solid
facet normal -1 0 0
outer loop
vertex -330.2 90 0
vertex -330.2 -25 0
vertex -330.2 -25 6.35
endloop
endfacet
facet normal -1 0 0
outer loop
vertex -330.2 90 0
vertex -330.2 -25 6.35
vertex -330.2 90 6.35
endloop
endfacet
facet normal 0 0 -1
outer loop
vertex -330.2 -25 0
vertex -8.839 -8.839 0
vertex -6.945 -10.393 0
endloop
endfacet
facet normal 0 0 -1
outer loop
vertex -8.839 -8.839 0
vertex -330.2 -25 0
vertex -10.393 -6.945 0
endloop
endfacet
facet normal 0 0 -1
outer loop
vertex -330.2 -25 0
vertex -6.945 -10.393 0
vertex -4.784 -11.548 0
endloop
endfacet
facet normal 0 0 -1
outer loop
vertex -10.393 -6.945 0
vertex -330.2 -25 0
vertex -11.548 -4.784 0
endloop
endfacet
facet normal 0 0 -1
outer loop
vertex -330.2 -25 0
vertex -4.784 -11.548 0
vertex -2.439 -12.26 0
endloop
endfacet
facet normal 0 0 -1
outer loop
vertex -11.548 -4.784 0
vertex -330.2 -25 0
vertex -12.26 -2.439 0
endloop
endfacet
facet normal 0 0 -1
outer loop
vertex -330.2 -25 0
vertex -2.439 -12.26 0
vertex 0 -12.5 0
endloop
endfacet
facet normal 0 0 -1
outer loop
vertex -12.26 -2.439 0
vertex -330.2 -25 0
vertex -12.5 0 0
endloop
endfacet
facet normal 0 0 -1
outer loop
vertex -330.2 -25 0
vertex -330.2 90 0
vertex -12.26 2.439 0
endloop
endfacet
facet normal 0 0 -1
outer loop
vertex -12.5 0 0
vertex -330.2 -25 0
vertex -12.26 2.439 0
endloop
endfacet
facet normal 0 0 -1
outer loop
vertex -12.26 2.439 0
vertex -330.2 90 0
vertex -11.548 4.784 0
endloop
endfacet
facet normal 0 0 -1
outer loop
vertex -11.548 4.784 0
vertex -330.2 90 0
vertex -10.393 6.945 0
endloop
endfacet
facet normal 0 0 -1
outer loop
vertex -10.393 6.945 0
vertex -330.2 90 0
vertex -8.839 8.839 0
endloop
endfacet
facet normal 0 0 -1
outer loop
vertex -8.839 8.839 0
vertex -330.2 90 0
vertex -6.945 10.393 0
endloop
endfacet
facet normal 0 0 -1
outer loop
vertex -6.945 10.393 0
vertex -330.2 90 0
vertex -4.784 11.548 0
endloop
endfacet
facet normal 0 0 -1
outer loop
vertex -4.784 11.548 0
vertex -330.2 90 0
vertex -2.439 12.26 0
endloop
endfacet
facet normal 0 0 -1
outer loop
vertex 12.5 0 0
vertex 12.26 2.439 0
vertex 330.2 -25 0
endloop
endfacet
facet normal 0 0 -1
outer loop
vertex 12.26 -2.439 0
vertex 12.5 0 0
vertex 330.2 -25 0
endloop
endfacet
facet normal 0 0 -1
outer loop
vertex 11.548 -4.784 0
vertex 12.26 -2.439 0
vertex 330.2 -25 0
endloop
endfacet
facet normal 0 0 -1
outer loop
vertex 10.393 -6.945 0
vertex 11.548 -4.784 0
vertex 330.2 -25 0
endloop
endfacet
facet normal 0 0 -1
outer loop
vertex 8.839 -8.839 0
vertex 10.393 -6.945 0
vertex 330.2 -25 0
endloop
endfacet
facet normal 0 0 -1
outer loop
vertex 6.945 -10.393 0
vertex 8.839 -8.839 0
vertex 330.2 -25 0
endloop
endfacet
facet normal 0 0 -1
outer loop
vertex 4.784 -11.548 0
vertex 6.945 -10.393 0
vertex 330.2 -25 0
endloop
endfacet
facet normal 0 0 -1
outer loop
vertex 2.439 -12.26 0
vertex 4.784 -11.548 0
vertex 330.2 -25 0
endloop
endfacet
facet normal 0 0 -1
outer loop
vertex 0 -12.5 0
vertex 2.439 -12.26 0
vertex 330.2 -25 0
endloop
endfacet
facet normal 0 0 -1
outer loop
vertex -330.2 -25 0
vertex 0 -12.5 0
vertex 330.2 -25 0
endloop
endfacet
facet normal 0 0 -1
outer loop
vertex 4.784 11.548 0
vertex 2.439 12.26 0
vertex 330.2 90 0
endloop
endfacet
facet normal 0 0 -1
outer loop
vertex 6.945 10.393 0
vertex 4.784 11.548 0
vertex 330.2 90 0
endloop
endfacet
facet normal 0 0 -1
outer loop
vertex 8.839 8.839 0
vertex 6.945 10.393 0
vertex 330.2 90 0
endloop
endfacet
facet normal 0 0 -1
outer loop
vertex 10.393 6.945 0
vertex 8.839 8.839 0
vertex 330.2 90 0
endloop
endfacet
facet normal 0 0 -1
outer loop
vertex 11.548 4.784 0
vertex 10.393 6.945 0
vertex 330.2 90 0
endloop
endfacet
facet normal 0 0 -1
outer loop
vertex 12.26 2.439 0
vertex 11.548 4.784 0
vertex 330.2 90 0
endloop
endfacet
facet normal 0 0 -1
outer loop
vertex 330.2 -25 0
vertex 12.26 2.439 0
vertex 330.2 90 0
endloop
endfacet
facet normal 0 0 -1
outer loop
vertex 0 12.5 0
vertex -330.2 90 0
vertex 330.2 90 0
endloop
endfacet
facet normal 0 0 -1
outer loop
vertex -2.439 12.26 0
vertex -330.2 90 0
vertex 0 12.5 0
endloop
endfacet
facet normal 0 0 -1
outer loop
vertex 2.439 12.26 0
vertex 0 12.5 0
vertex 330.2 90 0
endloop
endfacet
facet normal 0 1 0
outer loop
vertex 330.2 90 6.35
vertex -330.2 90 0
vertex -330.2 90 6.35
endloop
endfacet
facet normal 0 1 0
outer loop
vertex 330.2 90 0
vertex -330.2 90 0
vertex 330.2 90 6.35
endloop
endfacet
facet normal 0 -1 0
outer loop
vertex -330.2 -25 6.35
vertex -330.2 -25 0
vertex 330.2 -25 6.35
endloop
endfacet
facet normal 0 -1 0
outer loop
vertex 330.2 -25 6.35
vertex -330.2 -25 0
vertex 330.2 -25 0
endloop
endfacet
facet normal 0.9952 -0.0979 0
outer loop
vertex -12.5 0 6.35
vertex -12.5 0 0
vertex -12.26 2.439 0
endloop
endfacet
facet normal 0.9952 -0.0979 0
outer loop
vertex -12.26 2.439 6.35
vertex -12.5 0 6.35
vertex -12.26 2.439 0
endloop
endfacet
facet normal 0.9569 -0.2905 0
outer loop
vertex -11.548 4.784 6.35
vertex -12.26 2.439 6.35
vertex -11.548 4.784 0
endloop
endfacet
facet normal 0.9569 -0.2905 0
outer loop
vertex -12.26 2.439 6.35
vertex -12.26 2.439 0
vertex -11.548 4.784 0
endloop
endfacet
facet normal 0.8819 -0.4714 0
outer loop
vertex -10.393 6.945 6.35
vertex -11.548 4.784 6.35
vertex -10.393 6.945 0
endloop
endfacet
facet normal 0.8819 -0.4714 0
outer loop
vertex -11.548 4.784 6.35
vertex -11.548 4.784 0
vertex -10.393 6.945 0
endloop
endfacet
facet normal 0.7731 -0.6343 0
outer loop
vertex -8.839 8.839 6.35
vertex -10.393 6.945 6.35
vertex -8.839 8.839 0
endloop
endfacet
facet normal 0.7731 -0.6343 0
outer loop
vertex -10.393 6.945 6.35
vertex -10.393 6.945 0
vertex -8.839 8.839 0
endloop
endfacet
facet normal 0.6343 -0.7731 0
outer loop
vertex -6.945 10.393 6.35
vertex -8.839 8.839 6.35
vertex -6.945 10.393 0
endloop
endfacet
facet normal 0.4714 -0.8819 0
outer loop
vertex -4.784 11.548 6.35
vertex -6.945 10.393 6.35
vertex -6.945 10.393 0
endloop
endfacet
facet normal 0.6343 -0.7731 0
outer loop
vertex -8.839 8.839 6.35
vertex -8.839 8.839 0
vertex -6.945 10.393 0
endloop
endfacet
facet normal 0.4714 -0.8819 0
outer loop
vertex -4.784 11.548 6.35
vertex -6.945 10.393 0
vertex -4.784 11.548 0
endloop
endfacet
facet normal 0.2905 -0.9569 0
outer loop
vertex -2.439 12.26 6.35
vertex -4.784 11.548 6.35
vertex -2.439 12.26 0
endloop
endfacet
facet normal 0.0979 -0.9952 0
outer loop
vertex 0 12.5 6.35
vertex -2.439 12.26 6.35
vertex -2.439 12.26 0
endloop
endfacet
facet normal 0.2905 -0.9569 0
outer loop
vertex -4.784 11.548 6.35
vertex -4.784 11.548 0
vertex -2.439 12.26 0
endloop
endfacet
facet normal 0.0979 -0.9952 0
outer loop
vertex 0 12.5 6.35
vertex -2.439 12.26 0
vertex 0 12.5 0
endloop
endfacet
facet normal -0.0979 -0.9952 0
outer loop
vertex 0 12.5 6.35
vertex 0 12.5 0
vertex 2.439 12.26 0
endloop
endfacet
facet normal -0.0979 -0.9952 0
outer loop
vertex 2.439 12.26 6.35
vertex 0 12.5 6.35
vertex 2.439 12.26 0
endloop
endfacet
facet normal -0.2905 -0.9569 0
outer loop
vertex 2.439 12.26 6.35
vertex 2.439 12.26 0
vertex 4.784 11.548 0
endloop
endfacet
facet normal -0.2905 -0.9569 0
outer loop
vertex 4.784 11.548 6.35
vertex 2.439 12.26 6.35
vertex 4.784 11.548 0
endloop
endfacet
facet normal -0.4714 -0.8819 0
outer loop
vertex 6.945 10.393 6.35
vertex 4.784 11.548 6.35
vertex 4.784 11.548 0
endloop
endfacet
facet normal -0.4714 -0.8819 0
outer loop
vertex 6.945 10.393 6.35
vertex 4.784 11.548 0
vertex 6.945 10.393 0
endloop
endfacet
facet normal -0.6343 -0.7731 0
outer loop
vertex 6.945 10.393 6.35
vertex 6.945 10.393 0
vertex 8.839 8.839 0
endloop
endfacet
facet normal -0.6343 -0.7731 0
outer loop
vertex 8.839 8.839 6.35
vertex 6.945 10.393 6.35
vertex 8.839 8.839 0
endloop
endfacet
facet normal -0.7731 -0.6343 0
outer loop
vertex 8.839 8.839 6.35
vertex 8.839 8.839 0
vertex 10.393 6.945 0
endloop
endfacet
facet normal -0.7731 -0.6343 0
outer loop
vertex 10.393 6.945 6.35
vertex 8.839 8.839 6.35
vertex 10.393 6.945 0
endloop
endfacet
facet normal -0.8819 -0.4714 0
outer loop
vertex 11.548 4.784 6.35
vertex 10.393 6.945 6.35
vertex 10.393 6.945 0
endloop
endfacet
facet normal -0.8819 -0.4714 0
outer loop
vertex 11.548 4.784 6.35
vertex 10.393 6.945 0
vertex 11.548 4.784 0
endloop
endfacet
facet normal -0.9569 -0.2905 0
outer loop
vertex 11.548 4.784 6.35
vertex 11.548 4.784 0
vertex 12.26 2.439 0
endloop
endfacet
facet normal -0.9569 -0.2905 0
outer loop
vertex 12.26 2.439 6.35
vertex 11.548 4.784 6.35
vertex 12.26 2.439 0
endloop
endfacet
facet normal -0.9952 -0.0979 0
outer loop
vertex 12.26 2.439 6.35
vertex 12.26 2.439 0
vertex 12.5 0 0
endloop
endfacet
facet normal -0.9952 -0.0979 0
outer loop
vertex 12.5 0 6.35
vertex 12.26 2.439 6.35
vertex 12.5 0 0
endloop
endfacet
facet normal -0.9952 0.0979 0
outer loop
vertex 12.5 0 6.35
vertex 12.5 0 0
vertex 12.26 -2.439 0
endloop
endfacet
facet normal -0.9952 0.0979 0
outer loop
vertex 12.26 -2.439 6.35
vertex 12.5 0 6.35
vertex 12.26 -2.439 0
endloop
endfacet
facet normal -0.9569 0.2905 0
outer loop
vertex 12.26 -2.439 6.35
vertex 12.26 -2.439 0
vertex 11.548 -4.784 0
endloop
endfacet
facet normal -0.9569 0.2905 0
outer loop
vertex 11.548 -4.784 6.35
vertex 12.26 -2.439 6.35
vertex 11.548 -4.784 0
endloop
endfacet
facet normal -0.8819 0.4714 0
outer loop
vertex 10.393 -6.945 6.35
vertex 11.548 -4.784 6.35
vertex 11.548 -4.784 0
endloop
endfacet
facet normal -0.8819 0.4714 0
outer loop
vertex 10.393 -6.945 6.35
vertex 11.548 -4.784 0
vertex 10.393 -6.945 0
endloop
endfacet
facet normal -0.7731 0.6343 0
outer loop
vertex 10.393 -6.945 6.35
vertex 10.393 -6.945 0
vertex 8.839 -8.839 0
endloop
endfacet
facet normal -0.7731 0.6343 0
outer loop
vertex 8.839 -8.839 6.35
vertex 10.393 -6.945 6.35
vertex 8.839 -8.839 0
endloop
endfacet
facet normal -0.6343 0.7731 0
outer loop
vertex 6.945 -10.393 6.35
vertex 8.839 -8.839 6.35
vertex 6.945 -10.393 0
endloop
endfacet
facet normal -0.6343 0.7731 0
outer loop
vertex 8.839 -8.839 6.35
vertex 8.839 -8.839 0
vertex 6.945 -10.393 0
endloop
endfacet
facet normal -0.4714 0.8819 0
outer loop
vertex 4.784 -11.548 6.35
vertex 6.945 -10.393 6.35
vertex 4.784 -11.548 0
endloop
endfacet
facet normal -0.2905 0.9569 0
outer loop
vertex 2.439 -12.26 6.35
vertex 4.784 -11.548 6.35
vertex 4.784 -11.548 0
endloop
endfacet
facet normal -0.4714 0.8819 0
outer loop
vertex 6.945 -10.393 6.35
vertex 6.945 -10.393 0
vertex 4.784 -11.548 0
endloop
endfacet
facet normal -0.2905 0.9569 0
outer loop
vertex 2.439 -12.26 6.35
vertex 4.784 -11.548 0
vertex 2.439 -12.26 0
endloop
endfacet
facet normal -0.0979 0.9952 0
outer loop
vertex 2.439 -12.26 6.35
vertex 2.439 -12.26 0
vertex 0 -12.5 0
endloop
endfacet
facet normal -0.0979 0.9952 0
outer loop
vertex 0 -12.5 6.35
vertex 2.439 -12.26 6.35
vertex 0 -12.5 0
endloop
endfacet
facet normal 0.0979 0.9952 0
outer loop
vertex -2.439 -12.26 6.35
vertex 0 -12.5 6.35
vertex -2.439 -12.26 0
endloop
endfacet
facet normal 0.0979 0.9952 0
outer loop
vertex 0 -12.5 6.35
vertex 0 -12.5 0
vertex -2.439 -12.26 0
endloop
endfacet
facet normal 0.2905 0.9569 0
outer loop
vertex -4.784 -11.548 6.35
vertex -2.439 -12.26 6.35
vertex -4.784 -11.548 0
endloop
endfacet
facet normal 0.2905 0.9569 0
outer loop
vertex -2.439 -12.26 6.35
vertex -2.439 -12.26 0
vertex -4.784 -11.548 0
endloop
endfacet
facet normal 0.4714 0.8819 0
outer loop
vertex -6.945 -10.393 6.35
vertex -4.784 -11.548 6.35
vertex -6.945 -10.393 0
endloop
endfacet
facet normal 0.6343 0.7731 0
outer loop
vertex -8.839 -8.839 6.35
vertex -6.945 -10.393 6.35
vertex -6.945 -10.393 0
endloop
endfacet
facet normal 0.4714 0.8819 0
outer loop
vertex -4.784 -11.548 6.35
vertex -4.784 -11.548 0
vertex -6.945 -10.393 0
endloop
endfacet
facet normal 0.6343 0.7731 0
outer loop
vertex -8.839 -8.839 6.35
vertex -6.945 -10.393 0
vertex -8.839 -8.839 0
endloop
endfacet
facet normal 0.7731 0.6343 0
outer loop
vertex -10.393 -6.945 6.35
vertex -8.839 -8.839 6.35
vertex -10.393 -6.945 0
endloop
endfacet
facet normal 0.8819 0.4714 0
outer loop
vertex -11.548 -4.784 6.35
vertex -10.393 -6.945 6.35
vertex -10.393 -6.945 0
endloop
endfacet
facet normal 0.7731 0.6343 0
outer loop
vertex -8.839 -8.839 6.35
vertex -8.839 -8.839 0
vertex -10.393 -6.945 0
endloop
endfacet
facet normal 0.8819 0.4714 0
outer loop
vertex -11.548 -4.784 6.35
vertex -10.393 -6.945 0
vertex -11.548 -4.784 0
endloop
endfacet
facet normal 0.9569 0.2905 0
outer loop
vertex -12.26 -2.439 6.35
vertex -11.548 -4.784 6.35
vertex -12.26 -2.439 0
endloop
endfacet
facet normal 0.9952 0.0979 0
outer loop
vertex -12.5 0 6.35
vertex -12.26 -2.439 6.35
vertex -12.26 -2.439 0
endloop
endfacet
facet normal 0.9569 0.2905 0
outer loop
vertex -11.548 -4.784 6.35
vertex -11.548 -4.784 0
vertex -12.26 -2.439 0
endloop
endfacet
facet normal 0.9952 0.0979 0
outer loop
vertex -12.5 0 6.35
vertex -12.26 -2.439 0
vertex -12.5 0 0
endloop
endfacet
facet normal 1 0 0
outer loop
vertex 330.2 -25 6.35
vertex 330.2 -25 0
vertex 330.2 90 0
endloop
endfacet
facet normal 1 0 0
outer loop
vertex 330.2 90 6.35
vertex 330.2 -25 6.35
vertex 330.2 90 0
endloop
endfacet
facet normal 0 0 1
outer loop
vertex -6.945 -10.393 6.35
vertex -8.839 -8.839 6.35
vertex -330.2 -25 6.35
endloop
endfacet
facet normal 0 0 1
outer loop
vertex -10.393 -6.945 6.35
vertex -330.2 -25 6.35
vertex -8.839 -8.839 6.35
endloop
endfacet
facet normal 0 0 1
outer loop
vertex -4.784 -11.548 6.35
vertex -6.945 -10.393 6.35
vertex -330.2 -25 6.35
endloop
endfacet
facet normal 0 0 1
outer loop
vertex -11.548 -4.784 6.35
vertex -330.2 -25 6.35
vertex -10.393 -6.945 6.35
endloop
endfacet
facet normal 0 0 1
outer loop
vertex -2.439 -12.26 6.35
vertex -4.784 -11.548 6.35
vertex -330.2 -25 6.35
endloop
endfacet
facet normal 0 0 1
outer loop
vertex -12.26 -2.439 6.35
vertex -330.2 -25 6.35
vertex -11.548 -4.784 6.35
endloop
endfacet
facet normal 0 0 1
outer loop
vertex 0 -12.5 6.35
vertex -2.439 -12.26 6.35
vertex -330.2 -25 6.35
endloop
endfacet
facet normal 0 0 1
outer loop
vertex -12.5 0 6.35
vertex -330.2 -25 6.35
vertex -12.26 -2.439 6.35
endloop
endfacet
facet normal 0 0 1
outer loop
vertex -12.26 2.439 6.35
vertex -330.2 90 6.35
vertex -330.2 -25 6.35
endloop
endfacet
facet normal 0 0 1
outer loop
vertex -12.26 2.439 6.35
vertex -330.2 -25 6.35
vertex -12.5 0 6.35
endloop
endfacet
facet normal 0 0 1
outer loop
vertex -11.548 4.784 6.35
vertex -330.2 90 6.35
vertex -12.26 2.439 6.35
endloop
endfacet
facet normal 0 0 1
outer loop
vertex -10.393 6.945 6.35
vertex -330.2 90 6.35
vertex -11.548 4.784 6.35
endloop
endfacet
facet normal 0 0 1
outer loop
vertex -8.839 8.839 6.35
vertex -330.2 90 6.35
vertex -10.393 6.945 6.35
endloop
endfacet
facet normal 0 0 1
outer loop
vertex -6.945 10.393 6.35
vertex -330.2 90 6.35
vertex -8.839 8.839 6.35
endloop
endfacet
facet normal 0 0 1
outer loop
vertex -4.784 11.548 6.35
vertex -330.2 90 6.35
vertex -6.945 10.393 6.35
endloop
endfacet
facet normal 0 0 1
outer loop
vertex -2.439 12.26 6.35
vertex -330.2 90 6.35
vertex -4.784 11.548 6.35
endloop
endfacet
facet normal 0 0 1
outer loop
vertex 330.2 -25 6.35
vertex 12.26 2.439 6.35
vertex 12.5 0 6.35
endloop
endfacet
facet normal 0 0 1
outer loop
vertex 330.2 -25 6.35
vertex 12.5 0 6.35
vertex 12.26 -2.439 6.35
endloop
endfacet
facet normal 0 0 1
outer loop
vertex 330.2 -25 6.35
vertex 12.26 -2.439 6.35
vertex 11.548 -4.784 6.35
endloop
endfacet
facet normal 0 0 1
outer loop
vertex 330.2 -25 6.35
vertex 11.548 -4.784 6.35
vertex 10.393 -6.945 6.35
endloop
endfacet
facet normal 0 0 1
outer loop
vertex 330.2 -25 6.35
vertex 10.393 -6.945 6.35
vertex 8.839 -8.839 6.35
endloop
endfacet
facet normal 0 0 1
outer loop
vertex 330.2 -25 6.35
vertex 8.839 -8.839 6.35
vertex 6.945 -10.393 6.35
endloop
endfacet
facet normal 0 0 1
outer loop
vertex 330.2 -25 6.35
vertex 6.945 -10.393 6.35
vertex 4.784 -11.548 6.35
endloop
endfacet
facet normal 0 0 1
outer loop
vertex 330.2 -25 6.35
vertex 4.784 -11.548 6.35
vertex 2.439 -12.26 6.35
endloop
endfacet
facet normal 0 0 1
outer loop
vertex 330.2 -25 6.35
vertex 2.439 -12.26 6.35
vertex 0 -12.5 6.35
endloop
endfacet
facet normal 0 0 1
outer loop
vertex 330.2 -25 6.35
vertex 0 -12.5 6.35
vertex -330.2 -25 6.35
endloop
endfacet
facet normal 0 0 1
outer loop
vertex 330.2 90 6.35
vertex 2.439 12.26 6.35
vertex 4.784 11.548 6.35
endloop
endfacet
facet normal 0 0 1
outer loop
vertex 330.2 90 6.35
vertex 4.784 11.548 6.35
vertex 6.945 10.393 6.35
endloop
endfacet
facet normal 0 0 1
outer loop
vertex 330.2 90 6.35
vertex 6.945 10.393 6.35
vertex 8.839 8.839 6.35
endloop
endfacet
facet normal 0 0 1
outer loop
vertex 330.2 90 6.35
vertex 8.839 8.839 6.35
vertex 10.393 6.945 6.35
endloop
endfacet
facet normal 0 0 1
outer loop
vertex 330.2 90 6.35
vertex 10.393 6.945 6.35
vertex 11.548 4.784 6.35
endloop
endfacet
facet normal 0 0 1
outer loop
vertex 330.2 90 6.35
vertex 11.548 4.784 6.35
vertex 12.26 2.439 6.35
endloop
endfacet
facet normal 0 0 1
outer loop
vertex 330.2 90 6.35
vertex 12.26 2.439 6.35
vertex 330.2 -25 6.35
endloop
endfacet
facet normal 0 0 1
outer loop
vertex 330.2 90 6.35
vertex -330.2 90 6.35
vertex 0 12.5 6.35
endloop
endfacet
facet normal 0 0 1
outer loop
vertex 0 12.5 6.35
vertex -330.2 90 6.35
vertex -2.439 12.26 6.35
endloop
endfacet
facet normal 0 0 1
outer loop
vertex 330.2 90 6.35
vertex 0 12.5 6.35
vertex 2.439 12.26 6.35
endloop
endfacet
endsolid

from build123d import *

# Parameters (mm, degrees)
SKETCH1_W           = 660.4
SKETCH1_H           = 115
BOSS_EXTRUDE1_DEPTH = 6.35
SKETCH2_R           = 12.5
CUT_EXTRUDE1_DEPTH  = 343.304487993


with BuildPart() as part:
    # Sketch1 → Boss-Extrude1 (new body)
    with BuildSketch(Plane.XY):
        with Locations((0, 32.5)):
            Rectangle(SKETCH1_W, SKETCH1_H)
    extrude(amount=BOSS_EXTRUDE1_DEPTH)

    # Sketch2 → Cut-Extrude1 (cut, through all)
    with BuildSketch(Plane(origin=(0, 0, 0), x_dir=(-1, 0, 0), z_dir=(0, 0, -1))):
        Circle(SKETCH2_R)
    extrude(amount=-CUT_EXTRUDE1_DEPTH, mode=Mode.SUBTRACT)


solid = part.part
